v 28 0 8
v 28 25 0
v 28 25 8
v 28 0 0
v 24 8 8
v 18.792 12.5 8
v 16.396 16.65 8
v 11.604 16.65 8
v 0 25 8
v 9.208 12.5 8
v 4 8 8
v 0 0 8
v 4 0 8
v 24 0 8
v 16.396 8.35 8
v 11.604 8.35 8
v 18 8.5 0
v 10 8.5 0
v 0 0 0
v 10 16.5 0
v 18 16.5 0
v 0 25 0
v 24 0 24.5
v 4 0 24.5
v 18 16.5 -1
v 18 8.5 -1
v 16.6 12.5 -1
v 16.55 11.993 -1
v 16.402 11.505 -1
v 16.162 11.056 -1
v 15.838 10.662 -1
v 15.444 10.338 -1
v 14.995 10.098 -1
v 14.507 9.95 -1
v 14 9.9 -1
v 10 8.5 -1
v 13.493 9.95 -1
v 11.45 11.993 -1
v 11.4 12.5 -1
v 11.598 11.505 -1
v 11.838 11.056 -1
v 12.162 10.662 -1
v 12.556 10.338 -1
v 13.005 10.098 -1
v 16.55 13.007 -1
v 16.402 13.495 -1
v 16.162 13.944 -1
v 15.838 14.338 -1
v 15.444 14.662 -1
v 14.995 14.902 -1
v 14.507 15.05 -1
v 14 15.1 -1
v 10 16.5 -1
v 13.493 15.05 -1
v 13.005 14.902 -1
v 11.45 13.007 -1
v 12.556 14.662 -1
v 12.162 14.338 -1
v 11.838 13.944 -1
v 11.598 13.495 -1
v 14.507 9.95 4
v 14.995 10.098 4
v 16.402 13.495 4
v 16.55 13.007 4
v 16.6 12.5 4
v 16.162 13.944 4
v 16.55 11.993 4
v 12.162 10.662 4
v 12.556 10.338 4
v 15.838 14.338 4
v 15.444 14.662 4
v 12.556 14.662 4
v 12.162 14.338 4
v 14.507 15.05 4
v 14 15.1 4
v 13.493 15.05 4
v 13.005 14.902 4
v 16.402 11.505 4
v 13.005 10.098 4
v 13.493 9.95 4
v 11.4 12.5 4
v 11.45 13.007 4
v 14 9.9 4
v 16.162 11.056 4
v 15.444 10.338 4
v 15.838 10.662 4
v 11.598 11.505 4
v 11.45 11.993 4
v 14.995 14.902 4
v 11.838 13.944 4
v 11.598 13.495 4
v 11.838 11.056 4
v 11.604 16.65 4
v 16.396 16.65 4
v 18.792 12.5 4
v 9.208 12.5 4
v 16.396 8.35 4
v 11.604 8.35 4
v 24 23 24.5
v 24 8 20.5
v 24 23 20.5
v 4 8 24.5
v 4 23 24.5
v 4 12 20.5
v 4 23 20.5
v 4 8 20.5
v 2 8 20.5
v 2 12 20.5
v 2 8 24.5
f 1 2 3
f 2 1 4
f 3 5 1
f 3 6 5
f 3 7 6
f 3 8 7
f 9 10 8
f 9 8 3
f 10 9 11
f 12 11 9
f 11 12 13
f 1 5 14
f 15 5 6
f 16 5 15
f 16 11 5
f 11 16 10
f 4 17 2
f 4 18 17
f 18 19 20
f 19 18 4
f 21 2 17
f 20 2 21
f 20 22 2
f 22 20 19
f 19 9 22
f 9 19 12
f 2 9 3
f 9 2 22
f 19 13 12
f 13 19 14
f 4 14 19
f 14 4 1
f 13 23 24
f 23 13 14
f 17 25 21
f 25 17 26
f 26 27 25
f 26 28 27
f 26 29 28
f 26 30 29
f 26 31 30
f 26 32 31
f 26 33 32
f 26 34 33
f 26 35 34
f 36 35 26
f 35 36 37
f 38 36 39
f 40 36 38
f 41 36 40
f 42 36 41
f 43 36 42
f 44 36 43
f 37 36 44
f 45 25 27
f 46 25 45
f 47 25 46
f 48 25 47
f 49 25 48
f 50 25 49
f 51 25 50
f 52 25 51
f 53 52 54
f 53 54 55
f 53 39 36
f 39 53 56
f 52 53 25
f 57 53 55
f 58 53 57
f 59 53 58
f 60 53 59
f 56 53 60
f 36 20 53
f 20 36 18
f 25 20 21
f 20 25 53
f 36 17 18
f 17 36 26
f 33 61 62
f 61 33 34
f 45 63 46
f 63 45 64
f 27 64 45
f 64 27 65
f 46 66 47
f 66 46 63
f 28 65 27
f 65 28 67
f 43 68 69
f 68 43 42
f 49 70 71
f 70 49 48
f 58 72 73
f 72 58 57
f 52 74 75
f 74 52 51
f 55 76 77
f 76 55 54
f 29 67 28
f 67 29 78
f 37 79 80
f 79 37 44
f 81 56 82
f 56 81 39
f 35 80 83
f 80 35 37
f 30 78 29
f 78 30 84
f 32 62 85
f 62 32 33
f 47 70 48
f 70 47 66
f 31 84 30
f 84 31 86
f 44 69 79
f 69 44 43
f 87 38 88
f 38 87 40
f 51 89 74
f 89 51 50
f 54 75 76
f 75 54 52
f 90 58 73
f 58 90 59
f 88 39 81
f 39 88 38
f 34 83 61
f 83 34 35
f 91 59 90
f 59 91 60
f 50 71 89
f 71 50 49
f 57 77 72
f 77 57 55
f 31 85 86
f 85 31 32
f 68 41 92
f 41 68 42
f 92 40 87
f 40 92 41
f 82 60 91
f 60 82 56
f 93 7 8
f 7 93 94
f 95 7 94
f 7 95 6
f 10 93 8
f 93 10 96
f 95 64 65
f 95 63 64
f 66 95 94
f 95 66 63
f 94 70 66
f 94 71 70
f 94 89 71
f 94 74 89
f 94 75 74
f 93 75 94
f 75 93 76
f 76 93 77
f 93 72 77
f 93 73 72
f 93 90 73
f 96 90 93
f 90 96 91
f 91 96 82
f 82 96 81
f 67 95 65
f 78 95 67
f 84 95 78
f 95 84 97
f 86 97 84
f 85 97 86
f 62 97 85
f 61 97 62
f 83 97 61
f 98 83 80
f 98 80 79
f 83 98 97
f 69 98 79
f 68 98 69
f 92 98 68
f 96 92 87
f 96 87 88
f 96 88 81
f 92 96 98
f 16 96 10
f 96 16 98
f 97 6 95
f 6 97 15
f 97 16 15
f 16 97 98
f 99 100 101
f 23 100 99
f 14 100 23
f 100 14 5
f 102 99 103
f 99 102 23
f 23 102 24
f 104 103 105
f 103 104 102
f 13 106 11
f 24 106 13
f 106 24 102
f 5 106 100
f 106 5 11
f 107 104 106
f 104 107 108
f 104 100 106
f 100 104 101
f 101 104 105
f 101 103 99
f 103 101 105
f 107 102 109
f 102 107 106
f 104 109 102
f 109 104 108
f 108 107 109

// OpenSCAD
// file: ../lib/slot_mount.scad
// ============================================================
// Slot Mount Base Module
// ============================================================
// Reusable foundation for all shelf mounts
// Provides slot tab, mounting surface, M5 hole, and nut pocket

include <../params.scad>

module slot_mount_base() {
    // Horizontal base that sits on top of shelf
    // Need enough width for: slot tab + walls around nut pocket + channel side walls
    // Increased width provides more robust walls on sides of velcro channel
    base_width = 28;  // mm, provides 10mm wall on each side of slot tab
    base_depth = mount_body_d;
    base_height = mount_body_h;

    difference() {
        union() {
            // Main horizontal base body
            translate([0, 0, 0])
                cube([base_width, base_depth, base_height]);

            // Slot tab (extends downward from bottom of base)
            translate([(base_width - slot_tab_width) / 2,
                      (base_depth - slot_tab_width) / 2,
                      -slot_tab_depth])
                cube([slot_tab_width, slot_tab_width, slot_tab_depth]);
        }

        // M5 screw clearance hole (through entire base)
        translate([base_width / 2, base_depth / 2, -slot_tab_depth - 1])
            cylinder(h = base_height + slot_tab_depth + 2, d = m5_screw_d, $fn = 32);

        // Hex nut pocket (from top, side-loading style)
        // Using cos(30) to convert across-flats to circumradius
        translate([base_width / 2, base_depth / 2, base_height - m5_nut_h])
            cylinder(h = m5_nut_h + 1,
                    d = (m5_nut_w + nut_pocket_tol) / cos(30),
                    $fn = 6);
    }
}

// Test render
slot_mount_base();
// file: ../params.scad
// ============================================================
// Ham Radio Go Kit — OpenSCAD Parameters
// ============================================================

// ============================================================
// SHELF SLOT — MEASURED (configurable for other shelves)
// ============================================================
slot_width = 8.1;           // mm, slot opening width — MEASURED on Vevor shelf
slot_spacing = 5.0;         // mm, rail width between slots
shelf_thickness = 1.5;      // mm, shelf material thickness
slot_tab_width = 8.0;       // mm, tab width (fits in 8.1mm slot)
slot_tab_depth = 1.0;       // mm, tab depth - just prevents rotation, allows washer clearance
slot_tab_engage = 2.0;      // mm, minimum engagement depth for retention

// ============================================================
// M5 HARDWARE
// ============================================================
m5_screw_d = 5.2;           // mm, clearance hole diameter
m5_nut_w = 8.0;             // mm, hex nut width across flats
m5_nut_h = 4.0;             // mm, hex nut height
m5_washer_od = 10.0;        // mm, washer OD - verify clears slot

// ============================================================
// TOLERANCES
// ============================================================
fit_clearance = 0.2;        // mm, slot tab fit clearance
nut_pocket_tol = 0.3;       // mm, nut pocket oversize for capture

// ============================================================
// VELCRO STRAP MOUNTS
// ============================================================
velcro_width = 19.05;       // mm, 0.75" velcro - standardize all straps
velcro_channel_clearance = 1.0;  // mm, channel oversize
mount_body_w = 25.0;        // mm
mount_body_d = 25.0;        // mm
mount_body_h = 8.0;         // mm, sets max gear height that can be strapped

// ============================================================
// PINEBOOK PRO — measure closed unit with calipers
// ============================================================
pbp_w = 280.0;              // mm, width
pbp_d = 192.0;              // mm, depth
pbp_h = 12.0;               // mm, closed lid thickness — MEASURE
pbp_clearance = 0.5;        // mm, fit clearance inside captures

// L-mount (front, x2)
l_arm_thickness = 4.0;      // mm, horizontal arm thickness
l_arm_length = 15.0;        // mm, how far arm extends over laptop top

// Corner mount (rear, x2)
corner_wall_thickness = 4.0;  // mm
corner_wall_h = 20.0;         // mm, should be > pbp_h + corner_arm_thickness
corner_arm_length = 15.0;     // mm, top retention arm extends over laptop
corner_arm_thickness = 4.0;   // mm

// ============================================================
// MFJ-939 BRACKETS — measure on physical unit
// ============================================================
mfj939_chassis_w = 0.0;        // mm, outside width — MEASURE
mfj939_side_screw_d = 3.5;     // mm, #6-32 clearance hole — VERIFY
mfj939_side_screw_spacing = 0.0; // mm, fore/aft spacing between screw holes on side panel — MEASURE
mfj939_screw_height = 0.0;     // mm, screw centerline height above shelf surface — MEASURE

// Bracket geometry
bracket_foot_d = 25.0;         // mm, horizontal foot depth on shelf
bracket_foot_h = 8.0;          // mm, horizontal foot thickness
bracket_arm_thickness = 4.0;   // mm, vertical arm thickness
// main file
// ============================================================
// Pinebook Pro Front L-Mount
// ============================================================
// L-shaped mount with horizontal arm extending over laptop front edge
// Used in pairs at front left and front right positions

include <../params.scad>
use <../lib/slot_mount.scad>

module pinebook_l_mount() {
    // Use slot mount base
    base_width = 28;  // mm, matches slot_mount_base
    base_depth = mount_body_d;
    base_height = mount_body_h;

    // Vertical riser dimensions
    riser_height = pbp_h + pbp_clearance + l_arm_thickness;  // Tall enough to clear laptop + arm thickness
    riser_width = 20;  // mm, width of vertical section
    riser_thickness = 8;  // mm, front-to-back thickness

    union() {
        // Horizontal base with slot tab and nut pocket
        slot_mount_base();

        // Vertical riser (stands up from base)
        translate([(base_width - riser_width) / 2, 0, base_height])
            cube([riser_width, riser_thickness, riser_height]);

        // Horizontal arm (extends over laptop top)
        // Positioned at top of riser, extends forward
        translate([
            (base_width - riser_width) / 2,
            riser_thickness,
            base_height + riser_height - l_arm_thickness
        ])
            cube([riser_width, l_arm_length, l_arm_thickness]);

        // Add small support gussets at arm corners
        gusset_size = 4;  // mm

        // Left front gusset
        translate([
            (base_width - riser_width) / 2,
            riser_thickness,
            base_height + riser_height - l_arm_thickness
        ])
            rotate([0, -90, 0])
                linear_extrude(height = 2)
                    polygon([
                        [0, 0],
                        [l_arm_thickness, 0],
                        [0, gusset_size]
                    ]);

        // Right front gusset
        translate([
            (base_width + riser_width) / 2 - 2,
            riser_thickness,
            base_height + riser_height - l_arm_thickness
        ])
            rotate([0, -90, 0])
                linear_extrude(height = 2)
                    polygon([
                        [0, 0],
                        [l_arm_thickness, 0],
                        [0, gusset_size]
                    ]);
    }
}

// Render single mount for preview
pinebook_l_mount();

// Uncomment to render pair for printing
// pinebook_l_mount();
// translate([35, 0, 0])
//     pinebook_l_mount();
